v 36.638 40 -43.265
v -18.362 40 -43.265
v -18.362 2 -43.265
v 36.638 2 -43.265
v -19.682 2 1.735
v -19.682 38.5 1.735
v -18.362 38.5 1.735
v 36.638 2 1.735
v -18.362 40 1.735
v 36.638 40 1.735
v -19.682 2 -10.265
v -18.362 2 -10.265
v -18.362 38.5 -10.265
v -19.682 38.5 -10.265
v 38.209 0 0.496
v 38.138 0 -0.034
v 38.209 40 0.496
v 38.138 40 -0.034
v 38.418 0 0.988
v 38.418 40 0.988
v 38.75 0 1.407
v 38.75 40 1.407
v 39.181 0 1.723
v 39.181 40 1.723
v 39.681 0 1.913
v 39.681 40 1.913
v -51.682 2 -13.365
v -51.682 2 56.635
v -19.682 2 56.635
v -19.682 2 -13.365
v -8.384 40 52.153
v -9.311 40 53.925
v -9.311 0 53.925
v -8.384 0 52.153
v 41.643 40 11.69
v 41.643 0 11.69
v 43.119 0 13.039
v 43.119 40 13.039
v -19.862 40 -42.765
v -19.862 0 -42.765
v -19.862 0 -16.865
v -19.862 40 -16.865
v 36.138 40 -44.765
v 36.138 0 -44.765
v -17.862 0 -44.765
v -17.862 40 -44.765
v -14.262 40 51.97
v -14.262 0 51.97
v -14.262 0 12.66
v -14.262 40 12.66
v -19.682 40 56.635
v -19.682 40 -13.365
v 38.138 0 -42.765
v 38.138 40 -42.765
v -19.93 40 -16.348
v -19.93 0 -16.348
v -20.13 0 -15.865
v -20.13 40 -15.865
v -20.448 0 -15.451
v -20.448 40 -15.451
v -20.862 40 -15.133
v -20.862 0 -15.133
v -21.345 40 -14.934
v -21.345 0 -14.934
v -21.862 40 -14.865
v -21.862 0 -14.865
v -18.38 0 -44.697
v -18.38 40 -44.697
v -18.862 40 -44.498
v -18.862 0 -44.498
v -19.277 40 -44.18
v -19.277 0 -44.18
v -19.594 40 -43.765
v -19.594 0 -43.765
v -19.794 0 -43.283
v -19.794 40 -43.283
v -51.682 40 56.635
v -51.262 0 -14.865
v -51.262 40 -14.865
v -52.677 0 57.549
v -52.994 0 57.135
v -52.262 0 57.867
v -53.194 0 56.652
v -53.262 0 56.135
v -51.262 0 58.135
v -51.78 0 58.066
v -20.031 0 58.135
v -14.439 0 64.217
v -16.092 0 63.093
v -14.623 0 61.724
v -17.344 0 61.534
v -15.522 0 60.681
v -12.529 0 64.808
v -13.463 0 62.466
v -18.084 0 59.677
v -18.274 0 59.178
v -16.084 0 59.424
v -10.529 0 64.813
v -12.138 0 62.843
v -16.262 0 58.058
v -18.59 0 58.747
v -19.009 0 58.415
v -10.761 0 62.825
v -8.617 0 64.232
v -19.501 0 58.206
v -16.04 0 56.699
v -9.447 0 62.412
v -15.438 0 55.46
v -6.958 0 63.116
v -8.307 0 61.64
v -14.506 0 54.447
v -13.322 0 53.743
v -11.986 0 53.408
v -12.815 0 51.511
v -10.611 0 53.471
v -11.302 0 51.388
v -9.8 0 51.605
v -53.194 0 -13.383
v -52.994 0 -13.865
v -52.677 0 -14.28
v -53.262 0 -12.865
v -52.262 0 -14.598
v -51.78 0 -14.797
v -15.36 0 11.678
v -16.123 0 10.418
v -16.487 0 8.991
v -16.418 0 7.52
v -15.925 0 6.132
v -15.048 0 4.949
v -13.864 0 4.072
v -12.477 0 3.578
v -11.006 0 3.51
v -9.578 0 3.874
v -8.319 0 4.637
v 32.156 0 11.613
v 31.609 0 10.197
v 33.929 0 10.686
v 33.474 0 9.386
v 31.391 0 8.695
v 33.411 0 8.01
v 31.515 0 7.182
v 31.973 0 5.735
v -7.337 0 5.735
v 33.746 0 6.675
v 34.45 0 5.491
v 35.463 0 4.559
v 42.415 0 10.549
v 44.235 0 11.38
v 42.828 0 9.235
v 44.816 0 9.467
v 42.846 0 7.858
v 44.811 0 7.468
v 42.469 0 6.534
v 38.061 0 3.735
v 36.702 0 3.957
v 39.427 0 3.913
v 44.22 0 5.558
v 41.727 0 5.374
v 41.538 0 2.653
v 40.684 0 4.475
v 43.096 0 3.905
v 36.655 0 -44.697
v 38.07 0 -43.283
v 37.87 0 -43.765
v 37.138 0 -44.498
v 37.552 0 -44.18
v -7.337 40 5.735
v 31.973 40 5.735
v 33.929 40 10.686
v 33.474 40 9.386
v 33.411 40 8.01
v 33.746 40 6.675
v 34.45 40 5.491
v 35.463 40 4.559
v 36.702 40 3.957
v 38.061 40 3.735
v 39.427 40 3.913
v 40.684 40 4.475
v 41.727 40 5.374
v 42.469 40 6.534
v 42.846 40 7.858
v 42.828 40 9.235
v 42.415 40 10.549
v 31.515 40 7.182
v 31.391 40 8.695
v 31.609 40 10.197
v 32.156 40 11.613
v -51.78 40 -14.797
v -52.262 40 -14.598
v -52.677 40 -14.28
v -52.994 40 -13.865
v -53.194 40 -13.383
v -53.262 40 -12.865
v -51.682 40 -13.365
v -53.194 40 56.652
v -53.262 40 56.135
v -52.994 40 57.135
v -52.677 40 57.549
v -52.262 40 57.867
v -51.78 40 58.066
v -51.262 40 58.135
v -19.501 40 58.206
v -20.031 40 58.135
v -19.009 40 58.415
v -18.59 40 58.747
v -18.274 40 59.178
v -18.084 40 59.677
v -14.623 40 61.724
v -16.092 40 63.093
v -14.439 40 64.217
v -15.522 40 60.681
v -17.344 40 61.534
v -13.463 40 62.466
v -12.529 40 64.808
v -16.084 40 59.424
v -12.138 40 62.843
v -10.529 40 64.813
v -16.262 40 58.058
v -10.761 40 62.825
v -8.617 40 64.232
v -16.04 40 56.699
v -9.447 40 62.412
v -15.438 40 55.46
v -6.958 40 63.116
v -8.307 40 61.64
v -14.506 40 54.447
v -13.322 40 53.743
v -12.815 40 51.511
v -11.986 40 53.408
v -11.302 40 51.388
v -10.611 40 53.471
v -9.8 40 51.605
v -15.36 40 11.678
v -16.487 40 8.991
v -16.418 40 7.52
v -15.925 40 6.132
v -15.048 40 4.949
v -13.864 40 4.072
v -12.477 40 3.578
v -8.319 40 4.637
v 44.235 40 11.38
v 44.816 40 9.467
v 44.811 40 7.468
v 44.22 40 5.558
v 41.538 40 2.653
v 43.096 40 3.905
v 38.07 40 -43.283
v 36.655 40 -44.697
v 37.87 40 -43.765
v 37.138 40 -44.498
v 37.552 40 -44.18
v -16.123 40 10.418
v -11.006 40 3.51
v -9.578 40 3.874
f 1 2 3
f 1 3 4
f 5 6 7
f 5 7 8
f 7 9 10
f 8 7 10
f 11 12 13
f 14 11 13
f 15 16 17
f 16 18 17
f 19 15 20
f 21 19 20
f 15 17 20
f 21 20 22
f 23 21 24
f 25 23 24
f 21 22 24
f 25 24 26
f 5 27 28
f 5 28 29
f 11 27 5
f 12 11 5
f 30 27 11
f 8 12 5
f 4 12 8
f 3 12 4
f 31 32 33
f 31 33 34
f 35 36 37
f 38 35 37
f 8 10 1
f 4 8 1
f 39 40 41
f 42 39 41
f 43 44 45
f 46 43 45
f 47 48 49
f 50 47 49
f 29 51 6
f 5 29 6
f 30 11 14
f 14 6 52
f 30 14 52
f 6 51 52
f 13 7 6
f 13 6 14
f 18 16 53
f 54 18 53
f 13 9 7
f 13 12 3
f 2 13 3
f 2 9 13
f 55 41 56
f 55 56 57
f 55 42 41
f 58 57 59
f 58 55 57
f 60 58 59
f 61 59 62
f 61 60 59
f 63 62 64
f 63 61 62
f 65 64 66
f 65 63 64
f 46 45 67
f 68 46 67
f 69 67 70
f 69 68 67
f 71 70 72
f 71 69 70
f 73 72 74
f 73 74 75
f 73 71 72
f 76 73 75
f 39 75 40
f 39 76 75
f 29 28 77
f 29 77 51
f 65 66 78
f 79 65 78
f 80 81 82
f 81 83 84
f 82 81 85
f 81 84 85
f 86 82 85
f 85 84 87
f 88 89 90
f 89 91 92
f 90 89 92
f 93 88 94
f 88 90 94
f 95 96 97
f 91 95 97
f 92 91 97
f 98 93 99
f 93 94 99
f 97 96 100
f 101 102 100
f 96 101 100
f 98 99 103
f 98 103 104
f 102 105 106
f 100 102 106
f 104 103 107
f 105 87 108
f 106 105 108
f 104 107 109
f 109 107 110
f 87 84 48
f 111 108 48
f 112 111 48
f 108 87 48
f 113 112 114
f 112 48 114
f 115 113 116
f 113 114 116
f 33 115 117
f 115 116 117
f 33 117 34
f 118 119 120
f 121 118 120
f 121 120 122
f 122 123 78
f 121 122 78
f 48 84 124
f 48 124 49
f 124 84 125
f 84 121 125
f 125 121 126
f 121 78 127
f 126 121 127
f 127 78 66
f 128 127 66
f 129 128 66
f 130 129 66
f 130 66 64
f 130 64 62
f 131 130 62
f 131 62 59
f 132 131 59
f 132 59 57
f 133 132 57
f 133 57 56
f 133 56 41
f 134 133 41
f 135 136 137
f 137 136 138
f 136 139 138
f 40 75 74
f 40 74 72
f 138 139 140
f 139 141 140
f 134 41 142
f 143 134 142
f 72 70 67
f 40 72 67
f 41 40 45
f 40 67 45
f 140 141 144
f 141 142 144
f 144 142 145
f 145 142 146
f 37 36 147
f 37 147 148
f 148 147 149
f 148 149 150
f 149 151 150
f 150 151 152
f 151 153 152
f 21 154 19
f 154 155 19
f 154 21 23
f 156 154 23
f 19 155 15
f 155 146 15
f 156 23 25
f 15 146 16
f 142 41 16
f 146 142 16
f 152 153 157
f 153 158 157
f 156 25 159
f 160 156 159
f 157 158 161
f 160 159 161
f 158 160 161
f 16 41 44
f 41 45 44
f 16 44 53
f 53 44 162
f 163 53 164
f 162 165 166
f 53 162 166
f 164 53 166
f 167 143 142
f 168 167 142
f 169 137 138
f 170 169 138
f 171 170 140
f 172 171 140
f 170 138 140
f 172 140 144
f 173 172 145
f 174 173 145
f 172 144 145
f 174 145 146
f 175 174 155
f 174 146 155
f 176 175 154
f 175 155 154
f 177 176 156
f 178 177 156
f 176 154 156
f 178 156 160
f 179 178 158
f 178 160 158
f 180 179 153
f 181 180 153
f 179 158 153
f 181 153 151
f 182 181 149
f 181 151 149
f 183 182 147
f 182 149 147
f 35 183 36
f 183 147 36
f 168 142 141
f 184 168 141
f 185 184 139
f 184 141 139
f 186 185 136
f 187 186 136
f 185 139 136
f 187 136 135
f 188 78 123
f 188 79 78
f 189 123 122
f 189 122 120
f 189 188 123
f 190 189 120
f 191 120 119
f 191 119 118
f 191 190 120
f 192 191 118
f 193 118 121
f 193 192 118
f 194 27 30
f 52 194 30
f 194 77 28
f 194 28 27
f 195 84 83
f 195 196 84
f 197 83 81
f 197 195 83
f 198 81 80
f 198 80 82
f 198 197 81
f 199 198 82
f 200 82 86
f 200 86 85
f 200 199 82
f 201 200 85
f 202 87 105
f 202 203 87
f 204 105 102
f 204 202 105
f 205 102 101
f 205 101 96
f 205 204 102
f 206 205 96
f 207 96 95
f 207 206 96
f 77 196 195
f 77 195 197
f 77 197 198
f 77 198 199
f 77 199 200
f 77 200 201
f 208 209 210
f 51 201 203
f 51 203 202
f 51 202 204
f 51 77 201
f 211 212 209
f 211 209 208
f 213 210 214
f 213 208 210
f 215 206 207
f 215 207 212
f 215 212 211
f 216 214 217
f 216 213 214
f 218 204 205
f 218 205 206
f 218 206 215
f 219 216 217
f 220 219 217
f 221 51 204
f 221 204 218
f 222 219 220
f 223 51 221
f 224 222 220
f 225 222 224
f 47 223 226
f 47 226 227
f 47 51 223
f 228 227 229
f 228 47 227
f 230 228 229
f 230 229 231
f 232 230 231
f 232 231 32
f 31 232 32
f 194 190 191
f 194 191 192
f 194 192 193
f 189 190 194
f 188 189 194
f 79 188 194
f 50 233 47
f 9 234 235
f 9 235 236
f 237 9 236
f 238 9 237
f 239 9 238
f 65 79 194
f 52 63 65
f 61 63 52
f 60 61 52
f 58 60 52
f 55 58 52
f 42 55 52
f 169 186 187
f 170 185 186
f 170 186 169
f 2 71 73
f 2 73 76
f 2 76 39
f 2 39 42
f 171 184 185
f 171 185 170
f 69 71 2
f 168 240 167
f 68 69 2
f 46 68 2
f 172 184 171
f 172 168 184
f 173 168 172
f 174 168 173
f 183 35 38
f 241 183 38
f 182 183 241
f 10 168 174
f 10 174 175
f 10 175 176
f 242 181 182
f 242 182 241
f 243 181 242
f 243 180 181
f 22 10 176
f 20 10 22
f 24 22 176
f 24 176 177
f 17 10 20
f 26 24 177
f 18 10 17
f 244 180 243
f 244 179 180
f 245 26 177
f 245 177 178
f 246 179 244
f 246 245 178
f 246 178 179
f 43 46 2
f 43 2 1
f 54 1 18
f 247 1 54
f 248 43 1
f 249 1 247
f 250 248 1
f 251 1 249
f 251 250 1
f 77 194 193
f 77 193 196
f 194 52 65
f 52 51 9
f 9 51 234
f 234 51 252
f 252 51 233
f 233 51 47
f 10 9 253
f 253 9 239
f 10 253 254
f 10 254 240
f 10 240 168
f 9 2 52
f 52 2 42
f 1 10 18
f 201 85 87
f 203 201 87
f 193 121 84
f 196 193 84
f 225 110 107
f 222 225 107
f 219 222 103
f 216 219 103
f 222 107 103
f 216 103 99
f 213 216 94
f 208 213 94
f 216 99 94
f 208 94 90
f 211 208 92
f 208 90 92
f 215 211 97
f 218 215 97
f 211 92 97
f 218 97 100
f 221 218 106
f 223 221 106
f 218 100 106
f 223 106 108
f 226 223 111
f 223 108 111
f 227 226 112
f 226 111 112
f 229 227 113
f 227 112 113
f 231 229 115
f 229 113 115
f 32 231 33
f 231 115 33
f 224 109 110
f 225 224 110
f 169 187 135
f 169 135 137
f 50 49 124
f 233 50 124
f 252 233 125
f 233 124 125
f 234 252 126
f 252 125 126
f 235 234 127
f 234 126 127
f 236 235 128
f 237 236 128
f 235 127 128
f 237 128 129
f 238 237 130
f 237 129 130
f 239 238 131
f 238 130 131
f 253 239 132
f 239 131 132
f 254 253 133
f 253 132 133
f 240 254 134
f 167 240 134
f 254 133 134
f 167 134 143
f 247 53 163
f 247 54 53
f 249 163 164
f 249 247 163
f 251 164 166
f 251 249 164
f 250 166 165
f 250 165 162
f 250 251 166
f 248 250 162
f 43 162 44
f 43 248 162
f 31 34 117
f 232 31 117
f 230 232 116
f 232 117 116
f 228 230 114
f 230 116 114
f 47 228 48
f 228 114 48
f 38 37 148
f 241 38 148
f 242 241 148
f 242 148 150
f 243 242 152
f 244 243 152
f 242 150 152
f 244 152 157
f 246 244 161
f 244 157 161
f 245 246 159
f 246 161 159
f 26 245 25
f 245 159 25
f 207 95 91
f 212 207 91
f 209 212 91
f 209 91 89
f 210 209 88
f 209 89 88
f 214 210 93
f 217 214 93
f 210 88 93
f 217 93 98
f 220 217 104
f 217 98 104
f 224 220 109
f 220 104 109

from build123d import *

# Parameters (mm, degrees)
BOSS_EXTRUDE1_DEPTH = 40
BOSS_EXTRUDE6_DEPTH = 40
CUT_EXTRUDE1_START  = 40
SKETCH9_W           = 55
SKETCH9_H           = 45
CUT_EXTRUDE1_DEPTH  = 38
CUT_EXTRUDE3_START  = 40
SKETCH10_W          = 32
SKETCH10_H          = 70
CUT_EXTRUDE3_DEPTH  = 38
FILLET4_R           = 2
SKETCH11_W          = 12
SKETCH11_H          = 36.5
CUT_EXTRUDE4_DEPTH  = 5


with BuildPart() as part:
    # Sketch1 → Boss-Extrude1 (new body)
    with BuildSketch(Plane(origin=(0, 0, 0), x_dir=(1, 0, 0), z_dir=(0, 1, 0))):
        with BuildLine():
            Line((38.137674452, -1.734509714), (-11.512325548, -1.734509714))
            ThreePointArc((-11.512325548, -1.734509714), (-16.285296321, -3.711538941), (-18.262325548, -8.484509714))
            Line((-18.262325548, -8.484509714), (-18.262325548, -58.134509714))
            ThreePointArc((-18.262325548, -58.134509714), (-14.234303537, -64.311348374), (-6.957633451, -63.116204195))
            Line((-6.957633451, -63.116204195), (-8.30717185, -61.640146571))
            ThreePointArc((-8.30717185, -61.640146571), (-16.222632836, -58.747294544), (-9.310805247, -53.925494584))
            Line((-9.310805247, -53.925494584), (-8.383849331, -52.153277687))
            ThreePointArc((-8.383849331, -52.153277687), (-11.302087657, -51.387784581), (-14.262325548, -51.970095711))
            Line((-14.262325548, -51.970095711), (-14.262325548, -12.660332986))
            ThreePointArc((-14.262325548, -12.660332986), (-15.047859454, -4.948975808), (-7.336502276, -5.734509714))
            Line((-7.336502276, -5.734509714), (31.973260449, -5.734509714))
            ThreePointArc((31.973260449, -5.734509714), (31.390949319, -8.694747605), (32.156442425, -11.612985931))
            Line((32.156442425, -11.612985931), (33.928659322, -10.686030015))
            ThreePointArc((33.928659322, -10.686030015), (38.750459282, -3.774202426), (41.643311309, -11.689663412))
            Line((41.643311309, -11.689663412), (43.119368933, -13.039201811))
            ThreePointArc((43.119368933, -13.039201811), (44.314513112, -5.762531725), (38.137674452, -1.734509714))
        make_face()
    extrude(amount=BOSS_EXTRUDE1_DEPTH)

    # Sketch8 → Boss-Extrude6 (add)
    with BuildSketch(Plane(origin=(0, 0, 0), x_dir=(1, 0, 0), z_dir=(0, 1, 0))):
        with BuildLine():
            Line((-18.262325548, -58.134509714), (-18.262325548, -8.484509714))
            ThreePointArc((-18.262325548, -8.484509714), (-16.285296321, -3.711538941), (-11.512325548, -1.734509714))
            Line((-11.512325548, -1.734509714), (38.137674452, -1.734509714))
            Line((38.137674452, -1.734509714), (38.137674452, 44.765490286))
            Line((38.137674452, 44.765490286), (-19.862325548, 44.765490286))
            Line((-19.862325548, 44.765490286), (-19.862325548, 14.865490286))
            Line((-19.862325548, 14.865490286), (-53.262325548, 14.865490286))
            Line((-53.262325548, 14.865490286), (-53.262325548, -58.134509714))
            Line((-53.262325548, -58.134509714), (-18.262325548, -58.134509714))
        make_face()
    extrude(amount=BOSS_EXTRUDE6_DEPTH)

    # Sketch9 → Cut-Extrude1 (cut)
    with BuildSketch(Plane(origin=(0, 0, 0), x_dir=(1, 0, 0), z_dir=(0, 1, 0)).offset(CUT_EXTRUDE1_START)):
        with Locations((9.137674452, 20.765490286)):
            Rectangle(SKETCH9_W, SKETCH9_H)
    extrude(amount=-CUT_EXTRUDE1_DEPTH, mode=Mode.SUBTRACT)

    # Sketch10 → Cut-Extrude3 (cut)
    with BuildSketch(Plane(origin=(0, 0, 0), x_dir=(1, 0, 0), z_dir=(0, 1, 0)).offset(CUT_EXTRUDE3_START)):
        with Locations((-35.681852139, -21.634509714)):
            Rectangle(SKETCH10_W, SKETCH10_H)
    extrude(amount=-CUT_EXTRUDE3_DEPTH, mode=Mode.SUBTRACT)

    # Fillet4
    fillet4_edges = [part.edges().sort_by_distance(p)[0] for p in [
        (-18.262325548, 20, 58.134509714),
        (38.137674452, 20, 1.734509714),
        (38.137674452, 20, -44.765490286),
        (-19.862325548, 20, -44.765490286),
        (-19.862325548, 20, -14.865490286),
        (-53.262325548, 20, -14.865490286),
        (-53.262325548, 20, 58.134509714),
    ]]
    fillet(fillet4_edges, radius=FILLET4_R)

    # Sketch11 → Cut-Extrude4 (cut)
    with BuildSketch(Plane(origin=(-18.362325548, 0, 0), x_dir=(0, 0, -1), z_dir=(1, 0, 0))):
        with Locations((4.265490286, 20.25)):
            Rectangle(SKETCH11_W, SKETCH11_H)
    extrude(amount=-CUT_EXTRUDE4_DEPTH, mode=Mode.SUBTRACT)


solid = part.part
